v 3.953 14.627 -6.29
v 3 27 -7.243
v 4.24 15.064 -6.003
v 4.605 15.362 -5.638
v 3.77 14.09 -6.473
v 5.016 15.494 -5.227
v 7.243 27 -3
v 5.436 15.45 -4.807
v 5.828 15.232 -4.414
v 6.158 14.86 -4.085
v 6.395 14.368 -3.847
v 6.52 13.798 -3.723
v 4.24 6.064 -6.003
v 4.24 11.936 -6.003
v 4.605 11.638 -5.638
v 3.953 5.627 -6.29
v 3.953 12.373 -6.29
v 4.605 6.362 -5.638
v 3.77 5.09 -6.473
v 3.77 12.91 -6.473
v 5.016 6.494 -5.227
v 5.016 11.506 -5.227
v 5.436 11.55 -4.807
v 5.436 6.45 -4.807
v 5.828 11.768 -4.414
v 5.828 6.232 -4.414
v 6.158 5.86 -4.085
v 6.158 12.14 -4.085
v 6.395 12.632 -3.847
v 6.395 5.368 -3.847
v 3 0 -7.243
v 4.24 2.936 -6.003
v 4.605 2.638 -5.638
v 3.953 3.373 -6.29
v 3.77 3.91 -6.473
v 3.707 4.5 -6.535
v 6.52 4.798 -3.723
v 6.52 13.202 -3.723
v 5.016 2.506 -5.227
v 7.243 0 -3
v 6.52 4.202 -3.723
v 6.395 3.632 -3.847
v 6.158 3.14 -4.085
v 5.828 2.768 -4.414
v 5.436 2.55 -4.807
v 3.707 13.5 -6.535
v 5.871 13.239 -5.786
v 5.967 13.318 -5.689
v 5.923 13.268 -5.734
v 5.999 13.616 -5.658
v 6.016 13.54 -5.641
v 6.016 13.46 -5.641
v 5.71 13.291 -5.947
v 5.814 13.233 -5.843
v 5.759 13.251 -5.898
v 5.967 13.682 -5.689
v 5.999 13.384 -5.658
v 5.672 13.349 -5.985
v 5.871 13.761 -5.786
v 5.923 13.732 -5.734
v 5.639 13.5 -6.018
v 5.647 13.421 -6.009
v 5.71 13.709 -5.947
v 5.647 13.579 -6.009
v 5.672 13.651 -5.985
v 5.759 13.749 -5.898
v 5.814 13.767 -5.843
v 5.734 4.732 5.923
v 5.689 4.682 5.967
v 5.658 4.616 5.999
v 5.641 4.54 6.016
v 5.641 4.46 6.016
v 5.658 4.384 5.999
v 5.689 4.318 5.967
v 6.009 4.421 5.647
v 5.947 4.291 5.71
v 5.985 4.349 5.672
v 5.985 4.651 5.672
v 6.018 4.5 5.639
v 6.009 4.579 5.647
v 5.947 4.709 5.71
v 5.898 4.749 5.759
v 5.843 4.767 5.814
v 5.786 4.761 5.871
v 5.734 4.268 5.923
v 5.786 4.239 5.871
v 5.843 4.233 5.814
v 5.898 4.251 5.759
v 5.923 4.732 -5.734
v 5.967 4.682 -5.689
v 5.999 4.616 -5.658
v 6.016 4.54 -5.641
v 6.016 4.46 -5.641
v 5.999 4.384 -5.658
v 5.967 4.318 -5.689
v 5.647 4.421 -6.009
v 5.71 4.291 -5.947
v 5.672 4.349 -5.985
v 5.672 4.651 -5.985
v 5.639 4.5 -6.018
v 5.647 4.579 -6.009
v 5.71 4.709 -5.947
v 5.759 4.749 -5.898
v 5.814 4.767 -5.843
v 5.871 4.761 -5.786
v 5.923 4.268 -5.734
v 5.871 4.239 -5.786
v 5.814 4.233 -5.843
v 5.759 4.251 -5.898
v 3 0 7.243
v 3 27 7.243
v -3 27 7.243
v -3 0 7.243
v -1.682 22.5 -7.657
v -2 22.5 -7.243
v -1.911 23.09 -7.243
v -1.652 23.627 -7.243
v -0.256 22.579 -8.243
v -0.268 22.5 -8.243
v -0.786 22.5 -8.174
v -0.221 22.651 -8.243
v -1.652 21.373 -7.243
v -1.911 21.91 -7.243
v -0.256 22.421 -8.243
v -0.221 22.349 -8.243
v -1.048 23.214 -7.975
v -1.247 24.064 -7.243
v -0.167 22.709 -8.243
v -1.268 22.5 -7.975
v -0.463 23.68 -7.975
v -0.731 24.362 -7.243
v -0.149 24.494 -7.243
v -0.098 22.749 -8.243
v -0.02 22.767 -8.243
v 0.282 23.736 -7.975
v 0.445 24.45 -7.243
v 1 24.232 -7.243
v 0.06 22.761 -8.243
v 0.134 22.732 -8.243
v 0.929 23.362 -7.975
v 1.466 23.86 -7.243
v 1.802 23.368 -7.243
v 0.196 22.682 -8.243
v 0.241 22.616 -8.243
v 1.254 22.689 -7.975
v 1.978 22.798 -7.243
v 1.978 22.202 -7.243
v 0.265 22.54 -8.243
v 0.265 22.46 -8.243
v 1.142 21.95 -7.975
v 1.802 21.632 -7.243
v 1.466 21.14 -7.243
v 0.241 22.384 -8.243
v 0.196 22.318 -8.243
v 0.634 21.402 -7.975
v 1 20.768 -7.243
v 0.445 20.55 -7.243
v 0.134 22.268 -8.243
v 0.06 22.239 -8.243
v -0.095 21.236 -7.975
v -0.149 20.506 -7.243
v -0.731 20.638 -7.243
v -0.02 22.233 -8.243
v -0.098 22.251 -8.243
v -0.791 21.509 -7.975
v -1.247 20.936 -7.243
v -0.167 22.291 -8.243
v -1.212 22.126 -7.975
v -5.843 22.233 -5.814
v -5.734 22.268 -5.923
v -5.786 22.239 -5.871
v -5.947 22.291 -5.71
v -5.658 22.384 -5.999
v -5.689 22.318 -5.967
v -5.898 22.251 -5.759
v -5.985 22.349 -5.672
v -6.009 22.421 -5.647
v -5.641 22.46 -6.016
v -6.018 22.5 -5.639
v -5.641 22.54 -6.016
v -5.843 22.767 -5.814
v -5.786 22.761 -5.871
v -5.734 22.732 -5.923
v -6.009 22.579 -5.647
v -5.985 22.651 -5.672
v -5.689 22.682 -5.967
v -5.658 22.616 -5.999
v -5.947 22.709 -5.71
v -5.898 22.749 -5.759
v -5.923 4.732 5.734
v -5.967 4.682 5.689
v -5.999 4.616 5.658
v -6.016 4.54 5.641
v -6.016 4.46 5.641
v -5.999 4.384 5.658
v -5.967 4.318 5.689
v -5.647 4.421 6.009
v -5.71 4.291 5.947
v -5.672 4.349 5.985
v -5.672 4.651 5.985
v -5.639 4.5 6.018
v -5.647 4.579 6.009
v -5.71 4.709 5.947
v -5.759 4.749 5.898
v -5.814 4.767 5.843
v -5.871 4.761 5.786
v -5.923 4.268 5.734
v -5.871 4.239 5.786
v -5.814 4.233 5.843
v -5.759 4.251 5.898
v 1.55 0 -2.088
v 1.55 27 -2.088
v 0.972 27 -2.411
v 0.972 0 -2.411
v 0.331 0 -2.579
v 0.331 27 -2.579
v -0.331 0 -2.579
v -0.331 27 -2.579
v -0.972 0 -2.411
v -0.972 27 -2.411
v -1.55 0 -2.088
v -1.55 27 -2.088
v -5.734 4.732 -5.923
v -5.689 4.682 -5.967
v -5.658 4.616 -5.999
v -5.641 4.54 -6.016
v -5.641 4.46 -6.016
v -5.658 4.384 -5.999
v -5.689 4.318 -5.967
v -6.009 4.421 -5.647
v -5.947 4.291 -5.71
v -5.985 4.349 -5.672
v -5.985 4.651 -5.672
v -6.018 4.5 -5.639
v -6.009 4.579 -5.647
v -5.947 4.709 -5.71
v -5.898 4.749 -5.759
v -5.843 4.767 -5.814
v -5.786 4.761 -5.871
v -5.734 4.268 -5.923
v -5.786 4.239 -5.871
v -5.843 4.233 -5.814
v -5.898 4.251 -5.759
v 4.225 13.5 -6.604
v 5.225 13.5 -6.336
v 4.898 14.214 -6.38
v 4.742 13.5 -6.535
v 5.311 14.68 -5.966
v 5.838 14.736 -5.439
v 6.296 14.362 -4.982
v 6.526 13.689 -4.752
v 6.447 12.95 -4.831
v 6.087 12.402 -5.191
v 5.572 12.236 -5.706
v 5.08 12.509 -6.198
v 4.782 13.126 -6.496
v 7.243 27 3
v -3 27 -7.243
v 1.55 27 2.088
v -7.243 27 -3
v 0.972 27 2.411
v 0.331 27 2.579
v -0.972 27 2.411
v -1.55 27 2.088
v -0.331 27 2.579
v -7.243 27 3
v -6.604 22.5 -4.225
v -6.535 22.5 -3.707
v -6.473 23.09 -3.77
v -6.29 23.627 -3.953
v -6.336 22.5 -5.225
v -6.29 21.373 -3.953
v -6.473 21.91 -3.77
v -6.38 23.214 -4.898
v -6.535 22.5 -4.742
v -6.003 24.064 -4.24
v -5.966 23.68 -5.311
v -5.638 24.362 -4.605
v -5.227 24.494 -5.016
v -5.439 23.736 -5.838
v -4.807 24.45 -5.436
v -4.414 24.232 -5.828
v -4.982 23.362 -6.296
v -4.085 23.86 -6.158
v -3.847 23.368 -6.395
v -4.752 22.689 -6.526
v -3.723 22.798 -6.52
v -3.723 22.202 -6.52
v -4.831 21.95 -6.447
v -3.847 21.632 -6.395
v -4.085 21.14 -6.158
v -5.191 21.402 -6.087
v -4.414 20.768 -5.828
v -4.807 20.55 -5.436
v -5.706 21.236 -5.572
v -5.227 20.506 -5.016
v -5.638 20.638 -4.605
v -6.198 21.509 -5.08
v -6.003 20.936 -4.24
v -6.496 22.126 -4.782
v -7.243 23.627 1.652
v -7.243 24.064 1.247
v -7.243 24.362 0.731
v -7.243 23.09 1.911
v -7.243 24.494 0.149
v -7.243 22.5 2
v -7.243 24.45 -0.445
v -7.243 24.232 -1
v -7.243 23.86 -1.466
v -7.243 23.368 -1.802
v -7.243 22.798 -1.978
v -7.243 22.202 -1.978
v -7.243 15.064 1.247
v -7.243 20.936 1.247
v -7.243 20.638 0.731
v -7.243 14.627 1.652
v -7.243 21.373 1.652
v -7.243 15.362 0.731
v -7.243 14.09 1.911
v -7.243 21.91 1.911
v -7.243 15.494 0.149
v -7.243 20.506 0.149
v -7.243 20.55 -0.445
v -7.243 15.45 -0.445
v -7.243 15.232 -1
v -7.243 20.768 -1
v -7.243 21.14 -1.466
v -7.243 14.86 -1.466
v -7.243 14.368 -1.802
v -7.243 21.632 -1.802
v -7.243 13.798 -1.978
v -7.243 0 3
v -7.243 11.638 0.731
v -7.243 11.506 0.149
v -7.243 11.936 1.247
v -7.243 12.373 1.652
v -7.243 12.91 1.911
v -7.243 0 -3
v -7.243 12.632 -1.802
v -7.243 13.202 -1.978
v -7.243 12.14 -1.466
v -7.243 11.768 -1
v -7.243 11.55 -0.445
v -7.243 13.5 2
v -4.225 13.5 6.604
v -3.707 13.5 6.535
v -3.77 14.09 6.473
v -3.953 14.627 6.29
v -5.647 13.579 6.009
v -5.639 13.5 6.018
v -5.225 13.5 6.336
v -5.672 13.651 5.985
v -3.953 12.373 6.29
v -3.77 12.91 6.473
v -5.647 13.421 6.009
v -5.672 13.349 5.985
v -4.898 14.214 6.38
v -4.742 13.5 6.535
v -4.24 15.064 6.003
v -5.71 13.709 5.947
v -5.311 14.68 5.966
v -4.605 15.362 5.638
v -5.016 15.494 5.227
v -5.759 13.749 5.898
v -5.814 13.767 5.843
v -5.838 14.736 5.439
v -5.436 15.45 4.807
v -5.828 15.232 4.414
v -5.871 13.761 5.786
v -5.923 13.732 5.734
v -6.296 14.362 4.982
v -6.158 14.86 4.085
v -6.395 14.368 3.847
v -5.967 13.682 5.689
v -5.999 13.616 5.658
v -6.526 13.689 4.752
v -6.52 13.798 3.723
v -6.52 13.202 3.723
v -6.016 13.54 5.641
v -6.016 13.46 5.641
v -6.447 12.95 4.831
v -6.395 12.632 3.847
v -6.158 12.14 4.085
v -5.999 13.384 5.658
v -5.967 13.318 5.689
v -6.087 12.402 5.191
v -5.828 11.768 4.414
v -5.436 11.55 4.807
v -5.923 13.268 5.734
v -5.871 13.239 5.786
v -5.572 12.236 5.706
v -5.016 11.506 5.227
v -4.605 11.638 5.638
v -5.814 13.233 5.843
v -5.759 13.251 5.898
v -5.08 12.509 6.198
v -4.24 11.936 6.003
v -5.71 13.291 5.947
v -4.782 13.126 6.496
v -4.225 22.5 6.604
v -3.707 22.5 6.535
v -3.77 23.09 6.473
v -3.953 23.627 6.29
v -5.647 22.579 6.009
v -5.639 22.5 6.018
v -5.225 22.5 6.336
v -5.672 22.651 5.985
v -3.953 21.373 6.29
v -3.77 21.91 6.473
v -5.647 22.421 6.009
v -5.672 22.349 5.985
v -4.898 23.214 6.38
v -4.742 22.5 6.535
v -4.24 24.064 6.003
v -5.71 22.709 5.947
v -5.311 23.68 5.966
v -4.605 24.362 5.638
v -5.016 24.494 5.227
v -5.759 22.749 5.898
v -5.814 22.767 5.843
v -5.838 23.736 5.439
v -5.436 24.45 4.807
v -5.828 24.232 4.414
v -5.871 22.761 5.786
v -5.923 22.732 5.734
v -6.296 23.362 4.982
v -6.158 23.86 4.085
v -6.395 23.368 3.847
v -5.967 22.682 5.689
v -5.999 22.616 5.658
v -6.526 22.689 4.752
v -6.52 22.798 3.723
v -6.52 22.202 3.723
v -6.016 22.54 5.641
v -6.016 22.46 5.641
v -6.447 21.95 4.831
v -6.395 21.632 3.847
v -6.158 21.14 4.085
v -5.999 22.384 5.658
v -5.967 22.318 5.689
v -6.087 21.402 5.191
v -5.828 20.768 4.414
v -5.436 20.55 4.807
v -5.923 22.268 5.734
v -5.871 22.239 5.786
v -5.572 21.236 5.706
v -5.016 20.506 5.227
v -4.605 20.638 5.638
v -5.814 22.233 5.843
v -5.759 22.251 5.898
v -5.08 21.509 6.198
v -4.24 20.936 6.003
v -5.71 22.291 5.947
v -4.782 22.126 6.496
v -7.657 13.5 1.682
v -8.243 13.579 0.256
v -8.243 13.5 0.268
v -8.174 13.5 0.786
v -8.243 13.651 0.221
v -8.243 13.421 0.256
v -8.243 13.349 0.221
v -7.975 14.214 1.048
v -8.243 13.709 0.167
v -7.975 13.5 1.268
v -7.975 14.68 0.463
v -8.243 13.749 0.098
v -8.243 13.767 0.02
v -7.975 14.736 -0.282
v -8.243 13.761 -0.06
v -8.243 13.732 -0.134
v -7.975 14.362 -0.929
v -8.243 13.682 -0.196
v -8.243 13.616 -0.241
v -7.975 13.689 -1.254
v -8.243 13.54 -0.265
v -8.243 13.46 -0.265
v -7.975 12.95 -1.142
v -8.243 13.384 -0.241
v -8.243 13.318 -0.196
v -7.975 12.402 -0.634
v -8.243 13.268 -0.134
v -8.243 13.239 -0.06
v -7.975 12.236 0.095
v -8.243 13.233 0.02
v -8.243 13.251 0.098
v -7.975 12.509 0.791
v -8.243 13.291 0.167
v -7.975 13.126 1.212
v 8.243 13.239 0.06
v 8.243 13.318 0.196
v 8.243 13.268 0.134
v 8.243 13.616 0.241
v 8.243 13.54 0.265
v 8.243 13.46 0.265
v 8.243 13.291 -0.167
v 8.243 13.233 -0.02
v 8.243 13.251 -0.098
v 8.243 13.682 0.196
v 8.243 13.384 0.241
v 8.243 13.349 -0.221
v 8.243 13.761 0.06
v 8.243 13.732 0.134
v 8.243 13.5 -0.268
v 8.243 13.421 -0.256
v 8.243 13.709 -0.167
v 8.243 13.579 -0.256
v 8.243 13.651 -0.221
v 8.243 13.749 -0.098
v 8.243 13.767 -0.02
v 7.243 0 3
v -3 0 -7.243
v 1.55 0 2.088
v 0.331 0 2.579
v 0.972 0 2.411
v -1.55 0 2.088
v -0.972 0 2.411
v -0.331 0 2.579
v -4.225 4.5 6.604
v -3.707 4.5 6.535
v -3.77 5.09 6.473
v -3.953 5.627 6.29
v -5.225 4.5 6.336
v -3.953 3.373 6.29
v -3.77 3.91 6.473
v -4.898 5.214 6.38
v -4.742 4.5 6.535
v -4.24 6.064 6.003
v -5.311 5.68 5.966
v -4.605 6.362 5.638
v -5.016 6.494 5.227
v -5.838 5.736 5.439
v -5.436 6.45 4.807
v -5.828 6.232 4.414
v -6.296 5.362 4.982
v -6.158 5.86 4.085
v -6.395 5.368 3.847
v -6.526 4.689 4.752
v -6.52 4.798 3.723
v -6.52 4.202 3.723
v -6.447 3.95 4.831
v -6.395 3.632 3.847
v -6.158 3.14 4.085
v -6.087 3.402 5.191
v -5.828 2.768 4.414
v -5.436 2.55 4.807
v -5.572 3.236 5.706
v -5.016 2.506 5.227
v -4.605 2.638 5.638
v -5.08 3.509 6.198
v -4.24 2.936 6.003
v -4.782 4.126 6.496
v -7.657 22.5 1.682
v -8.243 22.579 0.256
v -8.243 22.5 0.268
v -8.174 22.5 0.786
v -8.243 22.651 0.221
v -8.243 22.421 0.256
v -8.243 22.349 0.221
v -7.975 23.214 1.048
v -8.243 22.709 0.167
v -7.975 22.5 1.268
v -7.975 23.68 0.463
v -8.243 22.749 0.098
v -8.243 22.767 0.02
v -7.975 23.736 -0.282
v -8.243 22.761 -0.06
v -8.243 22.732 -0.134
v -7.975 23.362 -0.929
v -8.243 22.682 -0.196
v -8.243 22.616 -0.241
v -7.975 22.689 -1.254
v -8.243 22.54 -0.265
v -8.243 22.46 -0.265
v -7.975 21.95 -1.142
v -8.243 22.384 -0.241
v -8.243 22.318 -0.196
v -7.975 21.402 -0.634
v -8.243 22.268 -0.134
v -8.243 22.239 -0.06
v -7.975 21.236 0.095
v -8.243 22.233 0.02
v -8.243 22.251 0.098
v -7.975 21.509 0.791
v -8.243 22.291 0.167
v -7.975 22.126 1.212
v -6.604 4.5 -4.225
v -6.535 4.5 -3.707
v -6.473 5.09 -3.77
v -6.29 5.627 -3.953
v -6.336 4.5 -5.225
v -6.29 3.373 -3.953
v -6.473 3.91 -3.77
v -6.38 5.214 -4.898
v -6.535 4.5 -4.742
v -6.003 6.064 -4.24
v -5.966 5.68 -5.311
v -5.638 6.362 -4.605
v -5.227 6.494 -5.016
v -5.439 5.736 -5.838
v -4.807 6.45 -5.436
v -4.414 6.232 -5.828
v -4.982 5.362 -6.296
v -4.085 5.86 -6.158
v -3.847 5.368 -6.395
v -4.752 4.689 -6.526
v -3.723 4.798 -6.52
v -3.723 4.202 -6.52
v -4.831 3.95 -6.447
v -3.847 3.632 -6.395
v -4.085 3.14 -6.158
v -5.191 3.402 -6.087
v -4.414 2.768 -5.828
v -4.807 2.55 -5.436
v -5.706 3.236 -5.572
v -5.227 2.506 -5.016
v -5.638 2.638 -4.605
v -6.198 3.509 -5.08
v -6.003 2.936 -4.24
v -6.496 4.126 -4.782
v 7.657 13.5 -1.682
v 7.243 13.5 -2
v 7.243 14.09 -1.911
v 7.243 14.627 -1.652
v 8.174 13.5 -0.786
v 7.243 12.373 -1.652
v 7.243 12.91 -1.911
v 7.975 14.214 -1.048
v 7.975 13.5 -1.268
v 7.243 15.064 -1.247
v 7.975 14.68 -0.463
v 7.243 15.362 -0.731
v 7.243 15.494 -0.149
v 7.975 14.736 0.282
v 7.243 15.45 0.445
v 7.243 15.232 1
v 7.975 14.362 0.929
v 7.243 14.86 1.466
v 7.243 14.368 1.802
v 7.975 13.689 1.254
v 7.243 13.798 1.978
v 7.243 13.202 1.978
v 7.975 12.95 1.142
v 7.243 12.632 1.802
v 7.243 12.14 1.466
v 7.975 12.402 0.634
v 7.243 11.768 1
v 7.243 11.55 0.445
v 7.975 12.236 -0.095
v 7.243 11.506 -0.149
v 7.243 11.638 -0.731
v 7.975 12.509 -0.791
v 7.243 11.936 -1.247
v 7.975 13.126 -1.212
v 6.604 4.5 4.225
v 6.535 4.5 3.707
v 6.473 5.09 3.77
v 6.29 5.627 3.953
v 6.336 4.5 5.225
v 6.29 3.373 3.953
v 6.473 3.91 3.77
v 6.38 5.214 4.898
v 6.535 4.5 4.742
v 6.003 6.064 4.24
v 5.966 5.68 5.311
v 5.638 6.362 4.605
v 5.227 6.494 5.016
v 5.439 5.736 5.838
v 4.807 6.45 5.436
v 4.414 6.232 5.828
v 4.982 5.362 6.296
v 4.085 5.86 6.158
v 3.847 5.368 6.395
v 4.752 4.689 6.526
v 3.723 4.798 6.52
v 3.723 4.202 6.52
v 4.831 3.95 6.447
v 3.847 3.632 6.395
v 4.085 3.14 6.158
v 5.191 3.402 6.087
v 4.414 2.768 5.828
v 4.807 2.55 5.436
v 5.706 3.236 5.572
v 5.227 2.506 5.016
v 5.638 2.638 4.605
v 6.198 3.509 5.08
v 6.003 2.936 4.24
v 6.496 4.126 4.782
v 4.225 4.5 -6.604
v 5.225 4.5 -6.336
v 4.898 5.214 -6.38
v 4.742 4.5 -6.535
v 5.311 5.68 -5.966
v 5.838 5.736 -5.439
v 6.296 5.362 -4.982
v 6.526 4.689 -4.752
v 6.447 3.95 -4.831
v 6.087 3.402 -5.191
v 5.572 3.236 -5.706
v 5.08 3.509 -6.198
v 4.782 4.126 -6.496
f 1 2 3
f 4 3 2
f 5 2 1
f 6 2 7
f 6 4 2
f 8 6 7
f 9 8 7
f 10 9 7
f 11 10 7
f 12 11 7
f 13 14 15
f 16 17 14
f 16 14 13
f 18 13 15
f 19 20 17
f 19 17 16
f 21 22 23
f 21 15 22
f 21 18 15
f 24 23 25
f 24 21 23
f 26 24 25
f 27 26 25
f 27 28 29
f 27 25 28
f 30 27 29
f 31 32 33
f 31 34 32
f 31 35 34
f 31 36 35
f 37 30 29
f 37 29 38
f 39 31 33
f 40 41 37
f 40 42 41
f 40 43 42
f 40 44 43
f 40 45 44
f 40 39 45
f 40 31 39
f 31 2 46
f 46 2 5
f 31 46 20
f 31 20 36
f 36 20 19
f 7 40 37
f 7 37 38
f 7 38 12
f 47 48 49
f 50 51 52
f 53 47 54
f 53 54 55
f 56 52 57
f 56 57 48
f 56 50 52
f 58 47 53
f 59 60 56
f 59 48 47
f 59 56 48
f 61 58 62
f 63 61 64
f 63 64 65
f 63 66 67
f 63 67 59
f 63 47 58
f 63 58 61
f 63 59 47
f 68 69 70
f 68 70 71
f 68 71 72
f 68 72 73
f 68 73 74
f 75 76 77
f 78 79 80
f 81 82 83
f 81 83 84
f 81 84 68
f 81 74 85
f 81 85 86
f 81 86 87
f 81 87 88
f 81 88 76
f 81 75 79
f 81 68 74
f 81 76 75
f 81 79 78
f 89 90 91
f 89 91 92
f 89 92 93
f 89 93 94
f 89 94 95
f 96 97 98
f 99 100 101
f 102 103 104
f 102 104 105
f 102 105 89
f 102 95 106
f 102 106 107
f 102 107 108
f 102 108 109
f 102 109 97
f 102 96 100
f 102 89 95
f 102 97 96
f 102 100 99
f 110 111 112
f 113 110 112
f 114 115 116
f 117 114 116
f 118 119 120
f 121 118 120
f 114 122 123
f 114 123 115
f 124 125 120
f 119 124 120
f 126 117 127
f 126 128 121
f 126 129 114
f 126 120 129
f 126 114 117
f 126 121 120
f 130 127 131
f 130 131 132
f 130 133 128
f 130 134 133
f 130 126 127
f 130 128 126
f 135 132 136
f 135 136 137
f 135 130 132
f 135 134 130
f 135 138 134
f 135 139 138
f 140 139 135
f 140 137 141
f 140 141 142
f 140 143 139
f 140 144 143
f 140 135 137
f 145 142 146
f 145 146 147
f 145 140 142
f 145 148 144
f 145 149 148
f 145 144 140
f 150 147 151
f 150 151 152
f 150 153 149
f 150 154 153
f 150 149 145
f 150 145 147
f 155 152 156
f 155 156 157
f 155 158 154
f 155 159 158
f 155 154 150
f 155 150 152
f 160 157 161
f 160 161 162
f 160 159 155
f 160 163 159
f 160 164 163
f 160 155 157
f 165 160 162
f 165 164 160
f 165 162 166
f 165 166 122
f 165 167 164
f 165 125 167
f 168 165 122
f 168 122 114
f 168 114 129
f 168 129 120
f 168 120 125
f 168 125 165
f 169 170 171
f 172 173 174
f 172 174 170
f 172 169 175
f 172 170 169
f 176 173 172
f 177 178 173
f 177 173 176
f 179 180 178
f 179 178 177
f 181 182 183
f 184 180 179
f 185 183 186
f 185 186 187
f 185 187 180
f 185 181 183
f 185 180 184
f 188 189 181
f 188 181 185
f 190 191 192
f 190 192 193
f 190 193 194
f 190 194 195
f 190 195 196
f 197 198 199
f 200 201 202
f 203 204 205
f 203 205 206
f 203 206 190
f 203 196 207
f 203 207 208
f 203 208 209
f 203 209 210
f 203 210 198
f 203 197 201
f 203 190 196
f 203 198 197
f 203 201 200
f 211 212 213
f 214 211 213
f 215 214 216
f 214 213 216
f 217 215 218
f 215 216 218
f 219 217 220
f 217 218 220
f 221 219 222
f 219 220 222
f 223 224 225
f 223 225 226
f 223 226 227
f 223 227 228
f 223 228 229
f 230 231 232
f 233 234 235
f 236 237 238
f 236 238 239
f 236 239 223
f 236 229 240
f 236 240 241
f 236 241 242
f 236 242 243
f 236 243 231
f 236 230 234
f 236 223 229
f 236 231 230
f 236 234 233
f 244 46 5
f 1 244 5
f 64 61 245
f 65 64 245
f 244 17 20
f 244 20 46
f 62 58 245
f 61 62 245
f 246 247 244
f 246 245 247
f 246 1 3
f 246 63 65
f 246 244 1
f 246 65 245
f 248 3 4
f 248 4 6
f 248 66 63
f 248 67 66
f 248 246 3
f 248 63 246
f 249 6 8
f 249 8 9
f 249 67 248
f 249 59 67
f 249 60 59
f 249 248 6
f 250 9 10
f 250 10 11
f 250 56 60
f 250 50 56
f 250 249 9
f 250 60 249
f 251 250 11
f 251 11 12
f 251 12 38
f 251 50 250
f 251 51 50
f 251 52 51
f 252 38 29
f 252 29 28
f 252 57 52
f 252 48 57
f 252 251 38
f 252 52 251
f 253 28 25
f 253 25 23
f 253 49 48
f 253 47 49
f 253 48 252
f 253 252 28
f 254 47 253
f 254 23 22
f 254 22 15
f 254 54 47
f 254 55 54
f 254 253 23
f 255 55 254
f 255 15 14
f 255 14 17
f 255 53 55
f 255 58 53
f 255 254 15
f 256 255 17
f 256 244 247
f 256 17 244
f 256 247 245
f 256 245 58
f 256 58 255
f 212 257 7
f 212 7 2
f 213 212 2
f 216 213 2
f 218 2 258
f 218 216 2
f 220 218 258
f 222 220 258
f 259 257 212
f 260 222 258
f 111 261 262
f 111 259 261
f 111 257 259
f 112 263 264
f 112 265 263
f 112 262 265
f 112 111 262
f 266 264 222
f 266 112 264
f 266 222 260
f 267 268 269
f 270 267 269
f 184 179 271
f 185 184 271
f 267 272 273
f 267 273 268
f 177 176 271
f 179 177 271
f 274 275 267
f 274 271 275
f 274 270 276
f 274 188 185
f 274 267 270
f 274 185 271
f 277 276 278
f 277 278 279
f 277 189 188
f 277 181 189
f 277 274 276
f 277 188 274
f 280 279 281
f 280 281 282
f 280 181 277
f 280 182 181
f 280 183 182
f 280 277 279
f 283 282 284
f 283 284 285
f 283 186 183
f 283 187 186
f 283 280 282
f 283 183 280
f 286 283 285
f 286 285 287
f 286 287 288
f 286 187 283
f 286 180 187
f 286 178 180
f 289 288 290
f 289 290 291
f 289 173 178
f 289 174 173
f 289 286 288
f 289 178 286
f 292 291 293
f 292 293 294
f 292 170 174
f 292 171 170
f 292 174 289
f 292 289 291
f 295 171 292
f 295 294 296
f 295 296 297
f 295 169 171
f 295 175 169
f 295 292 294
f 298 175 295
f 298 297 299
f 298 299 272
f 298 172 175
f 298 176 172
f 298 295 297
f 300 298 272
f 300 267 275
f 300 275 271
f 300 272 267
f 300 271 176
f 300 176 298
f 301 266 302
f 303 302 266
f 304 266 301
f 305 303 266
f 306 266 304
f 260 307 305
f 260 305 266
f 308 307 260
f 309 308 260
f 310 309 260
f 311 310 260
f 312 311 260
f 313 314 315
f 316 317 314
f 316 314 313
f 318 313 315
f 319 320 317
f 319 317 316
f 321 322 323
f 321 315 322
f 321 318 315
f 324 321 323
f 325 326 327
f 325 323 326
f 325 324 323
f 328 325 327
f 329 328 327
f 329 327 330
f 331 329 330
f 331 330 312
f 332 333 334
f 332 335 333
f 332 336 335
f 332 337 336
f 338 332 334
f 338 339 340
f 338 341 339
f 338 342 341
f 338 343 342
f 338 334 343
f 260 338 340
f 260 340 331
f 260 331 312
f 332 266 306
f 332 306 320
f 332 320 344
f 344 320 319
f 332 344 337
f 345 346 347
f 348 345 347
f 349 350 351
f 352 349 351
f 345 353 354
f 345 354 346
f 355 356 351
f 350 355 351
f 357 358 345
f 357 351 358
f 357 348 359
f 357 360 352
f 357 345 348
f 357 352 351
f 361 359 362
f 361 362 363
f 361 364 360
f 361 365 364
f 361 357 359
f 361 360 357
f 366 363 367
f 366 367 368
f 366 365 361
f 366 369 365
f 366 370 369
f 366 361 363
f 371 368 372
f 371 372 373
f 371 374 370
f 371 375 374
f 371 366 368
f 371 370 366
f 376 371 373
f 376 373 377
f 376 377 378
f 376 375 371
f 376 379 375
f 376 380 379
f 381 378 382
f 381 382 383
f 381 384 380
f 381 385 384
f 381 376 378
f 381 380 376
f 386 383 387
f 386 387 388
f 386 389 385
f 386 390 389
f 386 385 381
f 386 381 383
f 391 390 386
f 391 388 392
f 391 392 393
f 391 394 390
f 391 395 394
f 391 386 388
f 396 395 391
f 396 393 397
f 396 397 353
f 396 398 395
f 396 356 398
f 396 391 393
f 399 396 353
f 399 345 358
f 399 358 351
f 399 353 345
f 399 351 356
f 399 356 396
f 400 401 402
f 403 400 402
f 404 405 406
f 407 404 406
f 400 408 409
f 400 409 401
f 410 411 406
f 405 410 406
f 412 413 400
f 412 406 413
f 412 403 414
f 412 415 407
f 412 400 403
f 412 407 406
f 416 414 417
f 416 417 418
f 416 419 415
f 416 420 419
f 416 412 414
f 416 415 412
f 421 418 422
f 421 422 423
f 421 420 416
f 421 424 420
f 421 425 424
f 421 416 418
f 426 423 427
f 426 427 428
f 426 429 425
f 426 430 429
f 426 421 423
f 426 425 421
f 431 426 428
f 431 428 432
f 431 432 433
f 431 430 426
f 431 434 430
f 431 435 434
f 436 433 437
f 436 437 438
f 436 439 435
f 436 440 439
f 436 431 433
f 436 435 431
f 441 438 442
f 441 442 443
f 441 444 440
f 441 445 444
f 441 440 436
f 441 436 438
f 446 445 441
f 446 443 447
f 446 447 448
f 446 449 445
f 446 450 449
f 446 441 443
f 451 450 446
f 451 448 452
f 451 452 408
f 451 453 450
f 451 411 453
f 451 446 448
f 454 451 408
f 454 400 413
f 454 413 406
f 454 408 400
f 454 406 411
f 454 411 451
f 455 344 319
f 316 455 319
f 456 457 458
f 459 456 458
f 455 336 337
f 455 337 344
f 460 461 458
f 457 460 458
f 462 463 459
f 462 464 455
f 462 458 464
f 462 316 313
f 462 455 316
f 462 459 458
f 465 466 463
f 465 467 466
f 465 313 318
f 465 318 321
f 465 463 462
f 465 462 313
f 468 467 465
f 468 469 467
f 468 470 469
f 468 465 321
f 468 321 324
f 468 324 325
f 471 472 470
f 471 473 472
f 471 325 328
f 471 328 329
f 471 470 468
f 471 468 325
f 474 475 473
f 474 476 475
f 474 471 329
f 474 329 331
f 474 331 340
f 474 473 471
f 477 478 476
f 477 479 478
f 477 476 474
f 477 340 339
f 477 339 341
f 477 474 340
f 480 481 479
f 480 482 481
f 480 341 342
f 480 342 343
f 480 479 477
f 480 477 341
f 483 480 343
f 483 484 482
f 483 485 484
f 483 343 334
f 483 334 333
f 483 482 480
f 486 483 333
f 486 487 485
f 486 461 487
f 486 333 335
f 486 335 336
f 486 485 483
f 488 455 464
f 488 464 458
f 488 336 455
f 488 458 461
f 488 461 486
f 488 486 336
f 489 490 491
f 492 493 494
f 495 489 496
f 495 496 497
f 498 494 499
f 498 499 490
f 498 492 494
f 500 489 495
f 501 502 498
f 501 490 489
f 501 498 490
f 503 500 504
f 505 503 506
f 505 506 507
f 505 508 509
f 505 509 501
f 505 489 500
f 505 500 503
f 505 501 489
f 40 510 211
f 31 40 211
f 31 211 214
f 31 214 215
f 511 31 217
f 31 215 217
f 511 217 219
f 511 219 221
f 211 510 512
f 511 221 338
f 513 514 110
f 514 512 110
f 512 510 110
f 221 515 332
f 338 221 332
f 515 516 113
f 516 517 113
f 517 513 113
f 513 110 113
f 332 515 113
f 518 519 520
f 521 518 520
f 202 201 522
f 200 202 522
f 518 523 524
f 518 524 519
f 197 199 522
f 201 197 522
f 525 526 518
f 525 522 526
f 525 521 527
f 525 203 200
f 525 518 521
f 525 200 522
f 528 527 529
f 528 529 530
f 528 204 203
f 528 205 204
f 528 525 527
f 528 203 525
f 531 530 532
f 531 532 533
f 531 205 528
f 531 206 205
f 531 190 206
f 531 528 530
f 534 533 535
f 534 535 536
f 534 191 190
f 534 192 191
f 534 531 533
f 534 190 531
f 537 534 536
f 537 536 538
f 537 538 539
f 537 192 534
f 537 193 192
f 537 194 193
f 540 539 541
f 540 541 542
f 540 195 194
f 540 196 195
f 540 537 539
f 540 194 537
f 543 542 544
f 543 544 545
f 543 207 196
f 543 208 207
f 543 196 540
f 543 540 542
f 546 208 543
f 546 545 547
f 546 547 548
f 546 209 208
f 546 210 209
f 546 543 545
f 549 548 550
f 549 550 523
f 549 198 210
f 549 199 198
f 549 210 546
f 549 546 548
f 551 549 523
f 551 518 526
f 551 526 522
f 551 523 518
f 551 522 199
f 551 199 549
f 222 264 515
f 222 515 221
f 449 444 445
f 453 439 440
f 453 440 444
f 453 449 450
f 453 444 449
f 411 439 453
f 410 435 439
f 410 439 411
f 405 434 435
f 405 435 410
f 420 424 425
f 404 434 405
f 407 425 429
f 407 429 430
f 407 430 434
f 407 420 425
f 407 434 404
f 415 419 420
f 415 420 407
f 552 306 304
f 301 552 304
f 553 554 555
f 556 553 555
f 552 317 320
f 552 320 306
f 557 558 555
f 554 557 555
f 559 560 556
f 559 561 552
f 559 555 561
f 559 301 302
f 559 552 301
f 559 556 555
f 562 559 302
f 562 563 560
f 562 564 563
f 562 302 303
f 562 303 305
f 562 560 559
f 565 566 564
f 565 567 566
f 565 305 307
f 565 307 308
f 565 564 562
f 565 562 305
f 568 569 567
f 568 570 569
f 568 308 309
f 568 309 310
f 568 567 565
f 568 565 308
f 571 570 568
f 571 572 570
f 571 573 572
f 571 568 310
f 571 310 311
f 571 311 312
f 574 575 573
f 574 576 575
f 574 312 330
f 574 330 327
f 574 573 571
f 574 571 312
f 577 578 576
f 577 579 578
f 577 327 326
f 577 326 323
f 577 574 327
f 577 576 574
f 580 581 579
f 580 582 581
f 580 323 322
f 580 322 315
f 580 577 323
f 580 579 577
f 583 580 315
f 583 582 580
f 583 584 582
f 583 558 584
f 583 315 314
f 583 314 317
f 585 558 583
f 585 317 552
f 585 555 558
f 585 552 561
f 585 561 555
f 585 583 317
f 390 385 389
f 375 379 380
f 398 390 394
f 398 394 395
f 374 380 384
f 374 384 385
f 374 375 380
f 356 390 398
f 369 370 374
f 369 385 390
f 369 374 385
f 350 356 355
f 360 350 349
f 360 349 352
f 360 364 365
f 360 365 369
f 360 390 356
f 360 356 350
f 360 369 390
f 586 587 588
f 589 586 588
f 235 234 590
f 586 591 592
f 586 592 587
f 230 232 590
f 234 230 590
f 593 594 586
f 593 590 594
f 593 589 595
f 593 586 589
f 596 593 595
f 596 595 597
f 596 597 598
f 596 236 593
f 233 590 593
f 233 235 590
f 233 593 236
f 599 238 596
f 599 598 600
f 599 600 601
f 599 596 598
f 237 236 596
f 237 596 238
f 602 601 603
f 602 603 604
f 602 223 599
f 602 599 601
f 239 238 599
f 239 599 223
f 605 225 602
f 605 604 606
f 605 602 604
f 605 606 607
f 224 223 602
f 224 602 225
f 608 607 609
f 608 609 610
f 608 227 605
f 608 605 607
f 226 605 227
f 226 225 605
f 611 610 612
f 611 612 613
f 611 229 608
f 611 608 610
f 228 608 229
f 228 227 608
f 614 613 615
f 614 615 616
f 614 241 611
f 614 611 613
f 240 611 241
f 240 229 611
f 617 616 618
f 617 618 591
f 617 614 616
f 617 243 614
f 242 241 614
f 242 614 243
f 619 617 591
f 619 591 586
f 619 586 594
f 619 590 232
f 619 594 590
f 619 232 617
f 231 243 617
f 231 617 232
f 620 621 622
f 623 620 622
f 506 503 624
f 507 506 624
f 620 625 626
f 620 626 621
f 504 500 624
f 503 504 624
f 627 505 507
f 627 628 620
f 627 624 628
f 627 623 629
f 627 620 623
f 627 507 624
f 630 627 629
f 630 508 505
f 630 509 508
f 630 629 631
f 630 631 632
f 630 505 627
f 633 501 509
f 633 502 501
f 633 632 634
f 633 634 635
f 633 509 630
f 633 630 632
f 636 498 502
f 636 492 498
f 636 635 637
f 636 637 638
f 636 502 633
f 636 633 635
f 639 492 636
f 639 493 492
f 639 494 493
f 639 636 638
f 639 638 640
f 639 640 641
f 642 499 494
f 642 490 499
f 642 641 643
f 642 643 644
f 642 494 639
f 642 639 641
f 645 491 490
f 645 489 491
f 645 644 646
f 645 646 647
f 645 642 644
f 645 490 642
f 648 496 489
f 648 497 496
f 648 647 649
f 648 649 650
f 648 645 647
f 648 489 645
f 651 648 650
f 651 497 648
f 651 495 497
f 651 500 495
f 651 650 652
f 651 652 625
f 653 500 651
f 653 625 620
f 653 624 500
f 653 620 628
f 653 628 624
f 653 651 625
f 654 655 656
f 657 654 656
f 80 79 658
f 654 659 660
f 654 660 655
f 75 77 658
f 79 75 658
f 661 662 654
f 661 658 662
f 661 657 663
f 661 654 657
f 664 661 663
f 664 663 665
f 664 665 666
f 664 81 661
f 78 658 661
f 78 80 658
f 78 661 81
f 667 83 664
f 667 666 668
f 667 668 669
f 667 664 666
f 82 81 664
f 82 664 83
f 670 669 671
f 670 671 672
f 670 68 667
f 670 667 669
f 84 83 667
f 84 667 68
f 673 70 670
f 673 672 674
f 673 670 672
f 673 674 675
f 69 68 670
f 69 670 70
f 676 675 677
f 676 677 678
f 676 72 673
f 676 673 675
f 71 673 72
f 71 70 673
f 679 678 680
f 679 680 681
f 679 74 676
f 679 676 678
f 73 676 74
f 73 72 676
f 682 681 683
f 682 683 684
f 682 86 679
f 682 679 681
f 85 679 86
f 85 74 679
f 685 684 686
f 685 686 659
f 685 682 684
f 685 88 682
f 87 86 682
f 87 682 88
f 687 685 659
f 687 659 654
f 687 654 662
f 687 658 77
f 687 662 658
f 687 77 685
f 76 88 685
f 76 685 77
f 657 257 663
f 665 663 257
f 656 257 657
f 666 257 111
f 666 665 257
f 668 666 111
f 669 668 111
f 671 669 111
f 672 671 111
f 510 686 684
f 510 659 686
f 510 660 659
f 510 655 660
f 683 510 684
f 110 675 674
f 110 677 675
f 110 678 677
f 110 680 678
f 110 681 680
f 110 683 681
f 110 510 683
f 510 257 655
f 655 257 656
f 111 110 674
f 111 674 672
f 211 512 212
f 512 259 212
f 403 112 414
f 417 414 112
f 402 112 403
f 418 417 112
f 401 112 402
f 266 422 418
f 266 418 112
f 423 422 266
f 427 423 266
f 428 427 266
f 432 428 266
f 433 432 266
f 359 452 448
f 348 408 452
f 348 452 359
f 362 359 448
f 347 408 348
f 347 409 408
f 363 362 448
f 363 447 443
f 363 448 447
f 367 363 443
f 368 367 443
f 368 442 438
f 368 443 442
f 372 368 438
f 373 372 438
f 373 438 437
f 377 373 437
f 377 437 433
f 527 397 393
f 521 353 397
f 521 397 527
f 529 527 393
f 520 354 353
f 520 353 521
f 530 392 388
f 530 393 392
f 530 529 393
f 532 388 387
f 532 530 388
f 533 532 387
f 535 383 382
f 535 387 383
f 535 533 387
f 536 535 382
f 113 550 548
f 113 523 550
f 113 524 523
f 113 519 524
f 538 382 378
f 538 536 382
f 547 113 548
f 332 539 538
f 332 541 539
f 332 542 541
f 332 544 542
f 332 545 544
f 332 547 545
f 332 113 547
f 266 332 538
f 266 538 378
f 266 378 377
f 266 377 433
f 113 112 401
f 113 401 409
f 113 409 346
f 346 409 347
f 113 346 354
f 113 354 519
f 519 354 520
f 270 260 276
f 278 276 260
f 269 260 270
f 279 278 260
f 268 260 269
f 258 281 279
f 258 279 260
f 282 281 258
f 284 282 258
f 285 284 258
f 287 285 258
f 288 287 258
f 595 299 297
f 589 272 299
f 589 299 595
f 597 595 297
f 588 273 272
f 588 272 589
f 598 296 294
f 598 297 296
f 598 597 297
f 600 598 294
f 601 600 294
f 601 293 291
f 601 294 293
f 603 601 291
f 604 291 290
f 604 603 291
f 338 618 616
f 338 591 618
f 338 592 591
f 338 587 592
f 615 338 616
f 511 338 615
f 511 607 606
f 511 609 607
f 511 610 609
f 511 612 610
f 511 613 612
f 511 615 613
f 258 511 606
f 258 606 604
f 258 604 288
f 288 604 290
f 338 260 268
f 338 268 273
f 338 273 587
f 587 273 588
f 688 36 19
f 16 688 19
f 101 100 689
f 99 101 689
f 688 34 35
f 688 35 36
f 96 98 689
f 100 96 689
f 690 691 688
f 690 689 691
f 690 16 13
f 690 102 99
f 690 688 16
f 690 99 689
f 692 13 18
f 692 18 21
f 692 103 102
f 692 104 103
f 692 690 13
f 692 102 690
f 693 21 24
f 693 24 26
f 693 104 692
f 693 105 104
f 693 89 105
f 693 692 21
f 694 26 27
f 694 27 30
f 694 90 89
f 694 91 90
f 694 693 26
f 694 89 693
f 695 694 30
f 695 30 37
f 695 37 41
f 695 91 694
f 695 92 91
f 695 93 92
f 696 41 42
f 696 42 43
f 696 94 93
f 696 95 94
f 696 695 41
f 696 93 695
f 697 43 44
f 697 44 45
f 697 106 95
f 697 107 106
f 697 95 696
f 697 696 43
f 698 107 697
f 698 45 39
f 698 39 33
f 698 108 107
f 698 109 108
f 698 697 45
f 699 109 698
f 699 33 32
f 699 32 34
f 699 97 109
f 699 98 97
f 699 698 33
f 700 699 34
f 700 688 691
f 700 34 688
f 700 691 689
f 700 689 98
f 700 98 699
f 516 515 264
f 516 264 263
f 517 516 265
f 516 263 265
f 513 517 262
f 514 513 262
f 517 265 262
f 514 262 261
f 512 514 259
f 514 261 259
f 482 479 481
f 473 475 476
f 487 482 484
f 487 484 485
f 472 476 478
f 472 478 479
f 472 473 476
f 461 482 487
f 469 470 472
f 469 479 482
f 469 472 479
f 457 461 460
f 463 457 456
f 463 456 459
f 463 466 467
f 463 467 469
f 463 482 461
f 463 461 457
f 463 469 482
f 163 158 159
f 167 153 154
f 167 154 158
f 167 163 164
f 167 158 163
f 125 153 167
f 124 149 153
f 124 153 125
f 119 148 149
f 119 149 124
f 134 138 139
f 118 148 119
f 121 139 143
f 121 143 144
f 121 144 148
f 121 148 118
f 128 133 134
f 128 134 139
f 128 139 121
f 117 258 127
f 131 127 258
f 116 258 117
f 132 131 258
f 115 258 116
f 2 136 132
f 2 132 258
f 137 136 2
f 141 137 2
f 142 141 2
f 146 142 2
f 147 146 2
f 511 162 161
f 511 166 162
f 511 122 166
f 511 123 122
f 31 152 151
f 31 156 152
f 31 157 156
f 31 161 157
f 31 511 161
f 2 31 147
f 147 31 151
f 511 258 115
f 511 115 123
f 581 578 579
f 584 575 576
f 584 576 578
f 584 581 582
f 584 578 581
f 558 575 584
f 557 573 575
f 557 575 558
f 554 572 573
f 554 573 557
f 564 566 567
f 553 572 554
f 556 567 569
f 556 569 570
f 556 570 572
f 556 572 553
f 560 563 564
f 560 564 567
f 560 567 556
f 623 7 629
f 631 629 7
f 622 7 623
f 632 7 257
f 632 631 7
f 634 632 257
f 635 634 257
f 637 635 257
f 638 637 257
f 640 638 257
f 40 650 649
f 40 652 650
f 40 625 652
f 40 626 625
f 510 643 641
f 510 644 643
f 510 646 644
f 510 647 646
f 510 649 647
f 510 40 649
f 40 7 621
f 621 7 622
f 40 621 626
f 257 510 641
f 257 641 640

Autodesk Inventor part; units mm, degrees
ref_plane "YZ Plane" through (0, 0, 0) normal (1, 0, 0) x (0, 1, 0)
ref_plane "XZ Plane" through (0, 0, 0) normal (0, 1, 0) x (-1, 0, 0)
ref_plane "XY Plane" through (0, 0, 0) normal (0, 0, 1) x (1, 0, 0)
sketch "Sketch3" plane through (0, 0, 0) normal (0, 1, 0) x (-1, 0, 0)
  line L0 (-3, -7.2426) -> (-7.2426, -3)
  line L1 (-7.2426, -3) -> (-7.2426, 3)
  line L2 (-7.2426, 3) -> (-3, 7.2426)
  line L3 (-3, 7.2426) -> (3, 7.2426)
  line L4 (3, 7.2426) -> (7.2426, 3)
  line L5 (7.2426, 3) -> (7.2426, -3)
  line L6 (7.2426, -3) -> (3, -7.2426)
  line L7 (3, -7.2426) -> (-3, -7.2426)
  point P0 (0, 0)
  point P1 (0, 0)
  dimension "d3" = 6
extrude "Extrusion2" add sketch "Sketch3" along normal blind 27
sketch "Sketch4" plane through (7.2426, 0, 3) normal (0.7071068, 0, 0.7071068) x (0.7071068, 0, -0.7071068)
  circle A0 centre (-3, 4.5) radius 2
  point P0 (-3, 0)
  dimension "d6" = 4
  dimension "d7" = 4.5
sketch "Sketch5" plane through (7.2426, 0, 3) normal (1, 0, 0) x (0, 0, -1)
  circle A0 centre (3, 13.5) radius 2
  point P0 (3, 0)
  dimension "d8" = 4
  dimension "d9" = 13.5
sketch "Sketch6" plane through (3, 0, -7.2426) normal (0.7071068, 0, -0.7071068) x (-0.7071068, 0, -0.7071068)
  circle A0 centre (-3, 4.5) radius 2
  circle A1 centre (-3, 13.5) radius 2
  point P0 (-3, 0)
  dimension "d10" = 4
  dimension "d11" = 4
  dimension "d12" = 4.5
  dimension "d13" = 9
sketch "Sketch7" plane through (3, 0, -7.2426) normal (0, 0, -1) x (-1, 0, 0)
  circle A0 centre (3, 22.5) radius 2
  point P0 (3, 0)
  dimension "d14" = 4
  dimension "d15" = 22.5
sketch "Sketch8" plane through (-7.2426, 0, -3) normal (-0.7071068, 0, -0.7071068) x (-0.7071068, 0, 0.7071068)
  circle A0 centre (-3, 4.5) radius 2
  circle A1 centre (-3, 22.5) radius 2
  point P0 (-3, 0)
  dimension "d16" = 4
  dimension "d17" = 4.5
  dimension "d18" = 4
  dimension "d19" = 22.5
sketch "Sketch9" plane through (-7.2426, 0, -3) normal (-1, 0, 0) x (0, 0, 1)
  circle A0 centre (3, 13.5) radius 2
  circle A1 centre (3, 22.5) radius 2
  point P0 (3, 0)
  dimension "d20" = 4
  dimension "d21" = 4
  dimension "d22" = 13.5
  dimension "d23" = 22.5
sketch "Sketch10" plane through (-3, 0, 7.2426) normal (-0.7071068, 0, 0.7071068) x (0.7071068, 0, 0.7071068)
  circle A0 centre (-3, 4.5) radius 2
  circle A1 centre (-3, 13.5) radius 2
  circle A2 centre (-3, 22.5) radius 2
  point P0 (-3, 0)
  dimension "d24" = 4
  dimension "d25" = 4
  dimension "d26" = 4
  dimension "d27" = 4.5
  dimension "d28" = 9
  dimension "d29" = 9
extrude "Extrusion3" add sketch "Sketch4" along normal blind 1
extrude "Extrusion4" add sketch "Sketch5" along normal blind 1
extrude "Extrusion5" add sketch "Sketch6" along normal blind 1
extrude "Extrusion6" add sketch "Sketch7" along normal blind 1
extrude "Extrusion7" add sketch "Sketch8" along normal blind 1
extrude "Extrusion8" add sketch "Sketch9" along normal blind 1
extrude "Extrusion9" add sketch "Sketch10" along normal blind 1
fillet "Fillet1" radius 2 12 edges at (-7.2426, 22.5, 4.4142) (-7.2426, 13.5, 4.4142) (-7.2426, 4.5, 4.4142) (-8.2426, 13.5, -2) (-8.2426, 22.5, -2) (-4.4142, 22.5, -7.2426) (-4.4142, 4.5, -7.2426) (2, 22.5, -8.2426) (7.2426, 13.5, -4.4142) (7.2426, 4.5, -4.4142) (8.2426, 13.5, 2) (4.4142, 4.5, 7.2426)
ref_plane "Work Plane1" through (7.2426, 27, -3) normal (0, 1, 0) x (0, 0, -1)
sketch "Sketch12" plane through (7.2426, 27, -3) normal (0, 1, 0) x (0, 0, -1)
  point P0 (-3, 7.2426)
sketch "Sketch13" plane through (7.2426, 27, -3) normal (0, 1, 0) x (0, 0, -1)
  circle A0 centre (-3, 7.2426) radius 2.6
  line L0 (-5.0875, 5.6926) -> (-0.9125, 5.6926)
  line L1 (-5.0875, 8.7926) -> (-0.9125, 8.7926)
  dimension "d52" = 5.2
  dimension "d53" = 1.55
  dimension "d54" = 1.55
extrude "Extrusion10" cut sketch "Sketch13" against normal blind 58.75 contours A0 L0 L1
properties part number "8-Lados"
